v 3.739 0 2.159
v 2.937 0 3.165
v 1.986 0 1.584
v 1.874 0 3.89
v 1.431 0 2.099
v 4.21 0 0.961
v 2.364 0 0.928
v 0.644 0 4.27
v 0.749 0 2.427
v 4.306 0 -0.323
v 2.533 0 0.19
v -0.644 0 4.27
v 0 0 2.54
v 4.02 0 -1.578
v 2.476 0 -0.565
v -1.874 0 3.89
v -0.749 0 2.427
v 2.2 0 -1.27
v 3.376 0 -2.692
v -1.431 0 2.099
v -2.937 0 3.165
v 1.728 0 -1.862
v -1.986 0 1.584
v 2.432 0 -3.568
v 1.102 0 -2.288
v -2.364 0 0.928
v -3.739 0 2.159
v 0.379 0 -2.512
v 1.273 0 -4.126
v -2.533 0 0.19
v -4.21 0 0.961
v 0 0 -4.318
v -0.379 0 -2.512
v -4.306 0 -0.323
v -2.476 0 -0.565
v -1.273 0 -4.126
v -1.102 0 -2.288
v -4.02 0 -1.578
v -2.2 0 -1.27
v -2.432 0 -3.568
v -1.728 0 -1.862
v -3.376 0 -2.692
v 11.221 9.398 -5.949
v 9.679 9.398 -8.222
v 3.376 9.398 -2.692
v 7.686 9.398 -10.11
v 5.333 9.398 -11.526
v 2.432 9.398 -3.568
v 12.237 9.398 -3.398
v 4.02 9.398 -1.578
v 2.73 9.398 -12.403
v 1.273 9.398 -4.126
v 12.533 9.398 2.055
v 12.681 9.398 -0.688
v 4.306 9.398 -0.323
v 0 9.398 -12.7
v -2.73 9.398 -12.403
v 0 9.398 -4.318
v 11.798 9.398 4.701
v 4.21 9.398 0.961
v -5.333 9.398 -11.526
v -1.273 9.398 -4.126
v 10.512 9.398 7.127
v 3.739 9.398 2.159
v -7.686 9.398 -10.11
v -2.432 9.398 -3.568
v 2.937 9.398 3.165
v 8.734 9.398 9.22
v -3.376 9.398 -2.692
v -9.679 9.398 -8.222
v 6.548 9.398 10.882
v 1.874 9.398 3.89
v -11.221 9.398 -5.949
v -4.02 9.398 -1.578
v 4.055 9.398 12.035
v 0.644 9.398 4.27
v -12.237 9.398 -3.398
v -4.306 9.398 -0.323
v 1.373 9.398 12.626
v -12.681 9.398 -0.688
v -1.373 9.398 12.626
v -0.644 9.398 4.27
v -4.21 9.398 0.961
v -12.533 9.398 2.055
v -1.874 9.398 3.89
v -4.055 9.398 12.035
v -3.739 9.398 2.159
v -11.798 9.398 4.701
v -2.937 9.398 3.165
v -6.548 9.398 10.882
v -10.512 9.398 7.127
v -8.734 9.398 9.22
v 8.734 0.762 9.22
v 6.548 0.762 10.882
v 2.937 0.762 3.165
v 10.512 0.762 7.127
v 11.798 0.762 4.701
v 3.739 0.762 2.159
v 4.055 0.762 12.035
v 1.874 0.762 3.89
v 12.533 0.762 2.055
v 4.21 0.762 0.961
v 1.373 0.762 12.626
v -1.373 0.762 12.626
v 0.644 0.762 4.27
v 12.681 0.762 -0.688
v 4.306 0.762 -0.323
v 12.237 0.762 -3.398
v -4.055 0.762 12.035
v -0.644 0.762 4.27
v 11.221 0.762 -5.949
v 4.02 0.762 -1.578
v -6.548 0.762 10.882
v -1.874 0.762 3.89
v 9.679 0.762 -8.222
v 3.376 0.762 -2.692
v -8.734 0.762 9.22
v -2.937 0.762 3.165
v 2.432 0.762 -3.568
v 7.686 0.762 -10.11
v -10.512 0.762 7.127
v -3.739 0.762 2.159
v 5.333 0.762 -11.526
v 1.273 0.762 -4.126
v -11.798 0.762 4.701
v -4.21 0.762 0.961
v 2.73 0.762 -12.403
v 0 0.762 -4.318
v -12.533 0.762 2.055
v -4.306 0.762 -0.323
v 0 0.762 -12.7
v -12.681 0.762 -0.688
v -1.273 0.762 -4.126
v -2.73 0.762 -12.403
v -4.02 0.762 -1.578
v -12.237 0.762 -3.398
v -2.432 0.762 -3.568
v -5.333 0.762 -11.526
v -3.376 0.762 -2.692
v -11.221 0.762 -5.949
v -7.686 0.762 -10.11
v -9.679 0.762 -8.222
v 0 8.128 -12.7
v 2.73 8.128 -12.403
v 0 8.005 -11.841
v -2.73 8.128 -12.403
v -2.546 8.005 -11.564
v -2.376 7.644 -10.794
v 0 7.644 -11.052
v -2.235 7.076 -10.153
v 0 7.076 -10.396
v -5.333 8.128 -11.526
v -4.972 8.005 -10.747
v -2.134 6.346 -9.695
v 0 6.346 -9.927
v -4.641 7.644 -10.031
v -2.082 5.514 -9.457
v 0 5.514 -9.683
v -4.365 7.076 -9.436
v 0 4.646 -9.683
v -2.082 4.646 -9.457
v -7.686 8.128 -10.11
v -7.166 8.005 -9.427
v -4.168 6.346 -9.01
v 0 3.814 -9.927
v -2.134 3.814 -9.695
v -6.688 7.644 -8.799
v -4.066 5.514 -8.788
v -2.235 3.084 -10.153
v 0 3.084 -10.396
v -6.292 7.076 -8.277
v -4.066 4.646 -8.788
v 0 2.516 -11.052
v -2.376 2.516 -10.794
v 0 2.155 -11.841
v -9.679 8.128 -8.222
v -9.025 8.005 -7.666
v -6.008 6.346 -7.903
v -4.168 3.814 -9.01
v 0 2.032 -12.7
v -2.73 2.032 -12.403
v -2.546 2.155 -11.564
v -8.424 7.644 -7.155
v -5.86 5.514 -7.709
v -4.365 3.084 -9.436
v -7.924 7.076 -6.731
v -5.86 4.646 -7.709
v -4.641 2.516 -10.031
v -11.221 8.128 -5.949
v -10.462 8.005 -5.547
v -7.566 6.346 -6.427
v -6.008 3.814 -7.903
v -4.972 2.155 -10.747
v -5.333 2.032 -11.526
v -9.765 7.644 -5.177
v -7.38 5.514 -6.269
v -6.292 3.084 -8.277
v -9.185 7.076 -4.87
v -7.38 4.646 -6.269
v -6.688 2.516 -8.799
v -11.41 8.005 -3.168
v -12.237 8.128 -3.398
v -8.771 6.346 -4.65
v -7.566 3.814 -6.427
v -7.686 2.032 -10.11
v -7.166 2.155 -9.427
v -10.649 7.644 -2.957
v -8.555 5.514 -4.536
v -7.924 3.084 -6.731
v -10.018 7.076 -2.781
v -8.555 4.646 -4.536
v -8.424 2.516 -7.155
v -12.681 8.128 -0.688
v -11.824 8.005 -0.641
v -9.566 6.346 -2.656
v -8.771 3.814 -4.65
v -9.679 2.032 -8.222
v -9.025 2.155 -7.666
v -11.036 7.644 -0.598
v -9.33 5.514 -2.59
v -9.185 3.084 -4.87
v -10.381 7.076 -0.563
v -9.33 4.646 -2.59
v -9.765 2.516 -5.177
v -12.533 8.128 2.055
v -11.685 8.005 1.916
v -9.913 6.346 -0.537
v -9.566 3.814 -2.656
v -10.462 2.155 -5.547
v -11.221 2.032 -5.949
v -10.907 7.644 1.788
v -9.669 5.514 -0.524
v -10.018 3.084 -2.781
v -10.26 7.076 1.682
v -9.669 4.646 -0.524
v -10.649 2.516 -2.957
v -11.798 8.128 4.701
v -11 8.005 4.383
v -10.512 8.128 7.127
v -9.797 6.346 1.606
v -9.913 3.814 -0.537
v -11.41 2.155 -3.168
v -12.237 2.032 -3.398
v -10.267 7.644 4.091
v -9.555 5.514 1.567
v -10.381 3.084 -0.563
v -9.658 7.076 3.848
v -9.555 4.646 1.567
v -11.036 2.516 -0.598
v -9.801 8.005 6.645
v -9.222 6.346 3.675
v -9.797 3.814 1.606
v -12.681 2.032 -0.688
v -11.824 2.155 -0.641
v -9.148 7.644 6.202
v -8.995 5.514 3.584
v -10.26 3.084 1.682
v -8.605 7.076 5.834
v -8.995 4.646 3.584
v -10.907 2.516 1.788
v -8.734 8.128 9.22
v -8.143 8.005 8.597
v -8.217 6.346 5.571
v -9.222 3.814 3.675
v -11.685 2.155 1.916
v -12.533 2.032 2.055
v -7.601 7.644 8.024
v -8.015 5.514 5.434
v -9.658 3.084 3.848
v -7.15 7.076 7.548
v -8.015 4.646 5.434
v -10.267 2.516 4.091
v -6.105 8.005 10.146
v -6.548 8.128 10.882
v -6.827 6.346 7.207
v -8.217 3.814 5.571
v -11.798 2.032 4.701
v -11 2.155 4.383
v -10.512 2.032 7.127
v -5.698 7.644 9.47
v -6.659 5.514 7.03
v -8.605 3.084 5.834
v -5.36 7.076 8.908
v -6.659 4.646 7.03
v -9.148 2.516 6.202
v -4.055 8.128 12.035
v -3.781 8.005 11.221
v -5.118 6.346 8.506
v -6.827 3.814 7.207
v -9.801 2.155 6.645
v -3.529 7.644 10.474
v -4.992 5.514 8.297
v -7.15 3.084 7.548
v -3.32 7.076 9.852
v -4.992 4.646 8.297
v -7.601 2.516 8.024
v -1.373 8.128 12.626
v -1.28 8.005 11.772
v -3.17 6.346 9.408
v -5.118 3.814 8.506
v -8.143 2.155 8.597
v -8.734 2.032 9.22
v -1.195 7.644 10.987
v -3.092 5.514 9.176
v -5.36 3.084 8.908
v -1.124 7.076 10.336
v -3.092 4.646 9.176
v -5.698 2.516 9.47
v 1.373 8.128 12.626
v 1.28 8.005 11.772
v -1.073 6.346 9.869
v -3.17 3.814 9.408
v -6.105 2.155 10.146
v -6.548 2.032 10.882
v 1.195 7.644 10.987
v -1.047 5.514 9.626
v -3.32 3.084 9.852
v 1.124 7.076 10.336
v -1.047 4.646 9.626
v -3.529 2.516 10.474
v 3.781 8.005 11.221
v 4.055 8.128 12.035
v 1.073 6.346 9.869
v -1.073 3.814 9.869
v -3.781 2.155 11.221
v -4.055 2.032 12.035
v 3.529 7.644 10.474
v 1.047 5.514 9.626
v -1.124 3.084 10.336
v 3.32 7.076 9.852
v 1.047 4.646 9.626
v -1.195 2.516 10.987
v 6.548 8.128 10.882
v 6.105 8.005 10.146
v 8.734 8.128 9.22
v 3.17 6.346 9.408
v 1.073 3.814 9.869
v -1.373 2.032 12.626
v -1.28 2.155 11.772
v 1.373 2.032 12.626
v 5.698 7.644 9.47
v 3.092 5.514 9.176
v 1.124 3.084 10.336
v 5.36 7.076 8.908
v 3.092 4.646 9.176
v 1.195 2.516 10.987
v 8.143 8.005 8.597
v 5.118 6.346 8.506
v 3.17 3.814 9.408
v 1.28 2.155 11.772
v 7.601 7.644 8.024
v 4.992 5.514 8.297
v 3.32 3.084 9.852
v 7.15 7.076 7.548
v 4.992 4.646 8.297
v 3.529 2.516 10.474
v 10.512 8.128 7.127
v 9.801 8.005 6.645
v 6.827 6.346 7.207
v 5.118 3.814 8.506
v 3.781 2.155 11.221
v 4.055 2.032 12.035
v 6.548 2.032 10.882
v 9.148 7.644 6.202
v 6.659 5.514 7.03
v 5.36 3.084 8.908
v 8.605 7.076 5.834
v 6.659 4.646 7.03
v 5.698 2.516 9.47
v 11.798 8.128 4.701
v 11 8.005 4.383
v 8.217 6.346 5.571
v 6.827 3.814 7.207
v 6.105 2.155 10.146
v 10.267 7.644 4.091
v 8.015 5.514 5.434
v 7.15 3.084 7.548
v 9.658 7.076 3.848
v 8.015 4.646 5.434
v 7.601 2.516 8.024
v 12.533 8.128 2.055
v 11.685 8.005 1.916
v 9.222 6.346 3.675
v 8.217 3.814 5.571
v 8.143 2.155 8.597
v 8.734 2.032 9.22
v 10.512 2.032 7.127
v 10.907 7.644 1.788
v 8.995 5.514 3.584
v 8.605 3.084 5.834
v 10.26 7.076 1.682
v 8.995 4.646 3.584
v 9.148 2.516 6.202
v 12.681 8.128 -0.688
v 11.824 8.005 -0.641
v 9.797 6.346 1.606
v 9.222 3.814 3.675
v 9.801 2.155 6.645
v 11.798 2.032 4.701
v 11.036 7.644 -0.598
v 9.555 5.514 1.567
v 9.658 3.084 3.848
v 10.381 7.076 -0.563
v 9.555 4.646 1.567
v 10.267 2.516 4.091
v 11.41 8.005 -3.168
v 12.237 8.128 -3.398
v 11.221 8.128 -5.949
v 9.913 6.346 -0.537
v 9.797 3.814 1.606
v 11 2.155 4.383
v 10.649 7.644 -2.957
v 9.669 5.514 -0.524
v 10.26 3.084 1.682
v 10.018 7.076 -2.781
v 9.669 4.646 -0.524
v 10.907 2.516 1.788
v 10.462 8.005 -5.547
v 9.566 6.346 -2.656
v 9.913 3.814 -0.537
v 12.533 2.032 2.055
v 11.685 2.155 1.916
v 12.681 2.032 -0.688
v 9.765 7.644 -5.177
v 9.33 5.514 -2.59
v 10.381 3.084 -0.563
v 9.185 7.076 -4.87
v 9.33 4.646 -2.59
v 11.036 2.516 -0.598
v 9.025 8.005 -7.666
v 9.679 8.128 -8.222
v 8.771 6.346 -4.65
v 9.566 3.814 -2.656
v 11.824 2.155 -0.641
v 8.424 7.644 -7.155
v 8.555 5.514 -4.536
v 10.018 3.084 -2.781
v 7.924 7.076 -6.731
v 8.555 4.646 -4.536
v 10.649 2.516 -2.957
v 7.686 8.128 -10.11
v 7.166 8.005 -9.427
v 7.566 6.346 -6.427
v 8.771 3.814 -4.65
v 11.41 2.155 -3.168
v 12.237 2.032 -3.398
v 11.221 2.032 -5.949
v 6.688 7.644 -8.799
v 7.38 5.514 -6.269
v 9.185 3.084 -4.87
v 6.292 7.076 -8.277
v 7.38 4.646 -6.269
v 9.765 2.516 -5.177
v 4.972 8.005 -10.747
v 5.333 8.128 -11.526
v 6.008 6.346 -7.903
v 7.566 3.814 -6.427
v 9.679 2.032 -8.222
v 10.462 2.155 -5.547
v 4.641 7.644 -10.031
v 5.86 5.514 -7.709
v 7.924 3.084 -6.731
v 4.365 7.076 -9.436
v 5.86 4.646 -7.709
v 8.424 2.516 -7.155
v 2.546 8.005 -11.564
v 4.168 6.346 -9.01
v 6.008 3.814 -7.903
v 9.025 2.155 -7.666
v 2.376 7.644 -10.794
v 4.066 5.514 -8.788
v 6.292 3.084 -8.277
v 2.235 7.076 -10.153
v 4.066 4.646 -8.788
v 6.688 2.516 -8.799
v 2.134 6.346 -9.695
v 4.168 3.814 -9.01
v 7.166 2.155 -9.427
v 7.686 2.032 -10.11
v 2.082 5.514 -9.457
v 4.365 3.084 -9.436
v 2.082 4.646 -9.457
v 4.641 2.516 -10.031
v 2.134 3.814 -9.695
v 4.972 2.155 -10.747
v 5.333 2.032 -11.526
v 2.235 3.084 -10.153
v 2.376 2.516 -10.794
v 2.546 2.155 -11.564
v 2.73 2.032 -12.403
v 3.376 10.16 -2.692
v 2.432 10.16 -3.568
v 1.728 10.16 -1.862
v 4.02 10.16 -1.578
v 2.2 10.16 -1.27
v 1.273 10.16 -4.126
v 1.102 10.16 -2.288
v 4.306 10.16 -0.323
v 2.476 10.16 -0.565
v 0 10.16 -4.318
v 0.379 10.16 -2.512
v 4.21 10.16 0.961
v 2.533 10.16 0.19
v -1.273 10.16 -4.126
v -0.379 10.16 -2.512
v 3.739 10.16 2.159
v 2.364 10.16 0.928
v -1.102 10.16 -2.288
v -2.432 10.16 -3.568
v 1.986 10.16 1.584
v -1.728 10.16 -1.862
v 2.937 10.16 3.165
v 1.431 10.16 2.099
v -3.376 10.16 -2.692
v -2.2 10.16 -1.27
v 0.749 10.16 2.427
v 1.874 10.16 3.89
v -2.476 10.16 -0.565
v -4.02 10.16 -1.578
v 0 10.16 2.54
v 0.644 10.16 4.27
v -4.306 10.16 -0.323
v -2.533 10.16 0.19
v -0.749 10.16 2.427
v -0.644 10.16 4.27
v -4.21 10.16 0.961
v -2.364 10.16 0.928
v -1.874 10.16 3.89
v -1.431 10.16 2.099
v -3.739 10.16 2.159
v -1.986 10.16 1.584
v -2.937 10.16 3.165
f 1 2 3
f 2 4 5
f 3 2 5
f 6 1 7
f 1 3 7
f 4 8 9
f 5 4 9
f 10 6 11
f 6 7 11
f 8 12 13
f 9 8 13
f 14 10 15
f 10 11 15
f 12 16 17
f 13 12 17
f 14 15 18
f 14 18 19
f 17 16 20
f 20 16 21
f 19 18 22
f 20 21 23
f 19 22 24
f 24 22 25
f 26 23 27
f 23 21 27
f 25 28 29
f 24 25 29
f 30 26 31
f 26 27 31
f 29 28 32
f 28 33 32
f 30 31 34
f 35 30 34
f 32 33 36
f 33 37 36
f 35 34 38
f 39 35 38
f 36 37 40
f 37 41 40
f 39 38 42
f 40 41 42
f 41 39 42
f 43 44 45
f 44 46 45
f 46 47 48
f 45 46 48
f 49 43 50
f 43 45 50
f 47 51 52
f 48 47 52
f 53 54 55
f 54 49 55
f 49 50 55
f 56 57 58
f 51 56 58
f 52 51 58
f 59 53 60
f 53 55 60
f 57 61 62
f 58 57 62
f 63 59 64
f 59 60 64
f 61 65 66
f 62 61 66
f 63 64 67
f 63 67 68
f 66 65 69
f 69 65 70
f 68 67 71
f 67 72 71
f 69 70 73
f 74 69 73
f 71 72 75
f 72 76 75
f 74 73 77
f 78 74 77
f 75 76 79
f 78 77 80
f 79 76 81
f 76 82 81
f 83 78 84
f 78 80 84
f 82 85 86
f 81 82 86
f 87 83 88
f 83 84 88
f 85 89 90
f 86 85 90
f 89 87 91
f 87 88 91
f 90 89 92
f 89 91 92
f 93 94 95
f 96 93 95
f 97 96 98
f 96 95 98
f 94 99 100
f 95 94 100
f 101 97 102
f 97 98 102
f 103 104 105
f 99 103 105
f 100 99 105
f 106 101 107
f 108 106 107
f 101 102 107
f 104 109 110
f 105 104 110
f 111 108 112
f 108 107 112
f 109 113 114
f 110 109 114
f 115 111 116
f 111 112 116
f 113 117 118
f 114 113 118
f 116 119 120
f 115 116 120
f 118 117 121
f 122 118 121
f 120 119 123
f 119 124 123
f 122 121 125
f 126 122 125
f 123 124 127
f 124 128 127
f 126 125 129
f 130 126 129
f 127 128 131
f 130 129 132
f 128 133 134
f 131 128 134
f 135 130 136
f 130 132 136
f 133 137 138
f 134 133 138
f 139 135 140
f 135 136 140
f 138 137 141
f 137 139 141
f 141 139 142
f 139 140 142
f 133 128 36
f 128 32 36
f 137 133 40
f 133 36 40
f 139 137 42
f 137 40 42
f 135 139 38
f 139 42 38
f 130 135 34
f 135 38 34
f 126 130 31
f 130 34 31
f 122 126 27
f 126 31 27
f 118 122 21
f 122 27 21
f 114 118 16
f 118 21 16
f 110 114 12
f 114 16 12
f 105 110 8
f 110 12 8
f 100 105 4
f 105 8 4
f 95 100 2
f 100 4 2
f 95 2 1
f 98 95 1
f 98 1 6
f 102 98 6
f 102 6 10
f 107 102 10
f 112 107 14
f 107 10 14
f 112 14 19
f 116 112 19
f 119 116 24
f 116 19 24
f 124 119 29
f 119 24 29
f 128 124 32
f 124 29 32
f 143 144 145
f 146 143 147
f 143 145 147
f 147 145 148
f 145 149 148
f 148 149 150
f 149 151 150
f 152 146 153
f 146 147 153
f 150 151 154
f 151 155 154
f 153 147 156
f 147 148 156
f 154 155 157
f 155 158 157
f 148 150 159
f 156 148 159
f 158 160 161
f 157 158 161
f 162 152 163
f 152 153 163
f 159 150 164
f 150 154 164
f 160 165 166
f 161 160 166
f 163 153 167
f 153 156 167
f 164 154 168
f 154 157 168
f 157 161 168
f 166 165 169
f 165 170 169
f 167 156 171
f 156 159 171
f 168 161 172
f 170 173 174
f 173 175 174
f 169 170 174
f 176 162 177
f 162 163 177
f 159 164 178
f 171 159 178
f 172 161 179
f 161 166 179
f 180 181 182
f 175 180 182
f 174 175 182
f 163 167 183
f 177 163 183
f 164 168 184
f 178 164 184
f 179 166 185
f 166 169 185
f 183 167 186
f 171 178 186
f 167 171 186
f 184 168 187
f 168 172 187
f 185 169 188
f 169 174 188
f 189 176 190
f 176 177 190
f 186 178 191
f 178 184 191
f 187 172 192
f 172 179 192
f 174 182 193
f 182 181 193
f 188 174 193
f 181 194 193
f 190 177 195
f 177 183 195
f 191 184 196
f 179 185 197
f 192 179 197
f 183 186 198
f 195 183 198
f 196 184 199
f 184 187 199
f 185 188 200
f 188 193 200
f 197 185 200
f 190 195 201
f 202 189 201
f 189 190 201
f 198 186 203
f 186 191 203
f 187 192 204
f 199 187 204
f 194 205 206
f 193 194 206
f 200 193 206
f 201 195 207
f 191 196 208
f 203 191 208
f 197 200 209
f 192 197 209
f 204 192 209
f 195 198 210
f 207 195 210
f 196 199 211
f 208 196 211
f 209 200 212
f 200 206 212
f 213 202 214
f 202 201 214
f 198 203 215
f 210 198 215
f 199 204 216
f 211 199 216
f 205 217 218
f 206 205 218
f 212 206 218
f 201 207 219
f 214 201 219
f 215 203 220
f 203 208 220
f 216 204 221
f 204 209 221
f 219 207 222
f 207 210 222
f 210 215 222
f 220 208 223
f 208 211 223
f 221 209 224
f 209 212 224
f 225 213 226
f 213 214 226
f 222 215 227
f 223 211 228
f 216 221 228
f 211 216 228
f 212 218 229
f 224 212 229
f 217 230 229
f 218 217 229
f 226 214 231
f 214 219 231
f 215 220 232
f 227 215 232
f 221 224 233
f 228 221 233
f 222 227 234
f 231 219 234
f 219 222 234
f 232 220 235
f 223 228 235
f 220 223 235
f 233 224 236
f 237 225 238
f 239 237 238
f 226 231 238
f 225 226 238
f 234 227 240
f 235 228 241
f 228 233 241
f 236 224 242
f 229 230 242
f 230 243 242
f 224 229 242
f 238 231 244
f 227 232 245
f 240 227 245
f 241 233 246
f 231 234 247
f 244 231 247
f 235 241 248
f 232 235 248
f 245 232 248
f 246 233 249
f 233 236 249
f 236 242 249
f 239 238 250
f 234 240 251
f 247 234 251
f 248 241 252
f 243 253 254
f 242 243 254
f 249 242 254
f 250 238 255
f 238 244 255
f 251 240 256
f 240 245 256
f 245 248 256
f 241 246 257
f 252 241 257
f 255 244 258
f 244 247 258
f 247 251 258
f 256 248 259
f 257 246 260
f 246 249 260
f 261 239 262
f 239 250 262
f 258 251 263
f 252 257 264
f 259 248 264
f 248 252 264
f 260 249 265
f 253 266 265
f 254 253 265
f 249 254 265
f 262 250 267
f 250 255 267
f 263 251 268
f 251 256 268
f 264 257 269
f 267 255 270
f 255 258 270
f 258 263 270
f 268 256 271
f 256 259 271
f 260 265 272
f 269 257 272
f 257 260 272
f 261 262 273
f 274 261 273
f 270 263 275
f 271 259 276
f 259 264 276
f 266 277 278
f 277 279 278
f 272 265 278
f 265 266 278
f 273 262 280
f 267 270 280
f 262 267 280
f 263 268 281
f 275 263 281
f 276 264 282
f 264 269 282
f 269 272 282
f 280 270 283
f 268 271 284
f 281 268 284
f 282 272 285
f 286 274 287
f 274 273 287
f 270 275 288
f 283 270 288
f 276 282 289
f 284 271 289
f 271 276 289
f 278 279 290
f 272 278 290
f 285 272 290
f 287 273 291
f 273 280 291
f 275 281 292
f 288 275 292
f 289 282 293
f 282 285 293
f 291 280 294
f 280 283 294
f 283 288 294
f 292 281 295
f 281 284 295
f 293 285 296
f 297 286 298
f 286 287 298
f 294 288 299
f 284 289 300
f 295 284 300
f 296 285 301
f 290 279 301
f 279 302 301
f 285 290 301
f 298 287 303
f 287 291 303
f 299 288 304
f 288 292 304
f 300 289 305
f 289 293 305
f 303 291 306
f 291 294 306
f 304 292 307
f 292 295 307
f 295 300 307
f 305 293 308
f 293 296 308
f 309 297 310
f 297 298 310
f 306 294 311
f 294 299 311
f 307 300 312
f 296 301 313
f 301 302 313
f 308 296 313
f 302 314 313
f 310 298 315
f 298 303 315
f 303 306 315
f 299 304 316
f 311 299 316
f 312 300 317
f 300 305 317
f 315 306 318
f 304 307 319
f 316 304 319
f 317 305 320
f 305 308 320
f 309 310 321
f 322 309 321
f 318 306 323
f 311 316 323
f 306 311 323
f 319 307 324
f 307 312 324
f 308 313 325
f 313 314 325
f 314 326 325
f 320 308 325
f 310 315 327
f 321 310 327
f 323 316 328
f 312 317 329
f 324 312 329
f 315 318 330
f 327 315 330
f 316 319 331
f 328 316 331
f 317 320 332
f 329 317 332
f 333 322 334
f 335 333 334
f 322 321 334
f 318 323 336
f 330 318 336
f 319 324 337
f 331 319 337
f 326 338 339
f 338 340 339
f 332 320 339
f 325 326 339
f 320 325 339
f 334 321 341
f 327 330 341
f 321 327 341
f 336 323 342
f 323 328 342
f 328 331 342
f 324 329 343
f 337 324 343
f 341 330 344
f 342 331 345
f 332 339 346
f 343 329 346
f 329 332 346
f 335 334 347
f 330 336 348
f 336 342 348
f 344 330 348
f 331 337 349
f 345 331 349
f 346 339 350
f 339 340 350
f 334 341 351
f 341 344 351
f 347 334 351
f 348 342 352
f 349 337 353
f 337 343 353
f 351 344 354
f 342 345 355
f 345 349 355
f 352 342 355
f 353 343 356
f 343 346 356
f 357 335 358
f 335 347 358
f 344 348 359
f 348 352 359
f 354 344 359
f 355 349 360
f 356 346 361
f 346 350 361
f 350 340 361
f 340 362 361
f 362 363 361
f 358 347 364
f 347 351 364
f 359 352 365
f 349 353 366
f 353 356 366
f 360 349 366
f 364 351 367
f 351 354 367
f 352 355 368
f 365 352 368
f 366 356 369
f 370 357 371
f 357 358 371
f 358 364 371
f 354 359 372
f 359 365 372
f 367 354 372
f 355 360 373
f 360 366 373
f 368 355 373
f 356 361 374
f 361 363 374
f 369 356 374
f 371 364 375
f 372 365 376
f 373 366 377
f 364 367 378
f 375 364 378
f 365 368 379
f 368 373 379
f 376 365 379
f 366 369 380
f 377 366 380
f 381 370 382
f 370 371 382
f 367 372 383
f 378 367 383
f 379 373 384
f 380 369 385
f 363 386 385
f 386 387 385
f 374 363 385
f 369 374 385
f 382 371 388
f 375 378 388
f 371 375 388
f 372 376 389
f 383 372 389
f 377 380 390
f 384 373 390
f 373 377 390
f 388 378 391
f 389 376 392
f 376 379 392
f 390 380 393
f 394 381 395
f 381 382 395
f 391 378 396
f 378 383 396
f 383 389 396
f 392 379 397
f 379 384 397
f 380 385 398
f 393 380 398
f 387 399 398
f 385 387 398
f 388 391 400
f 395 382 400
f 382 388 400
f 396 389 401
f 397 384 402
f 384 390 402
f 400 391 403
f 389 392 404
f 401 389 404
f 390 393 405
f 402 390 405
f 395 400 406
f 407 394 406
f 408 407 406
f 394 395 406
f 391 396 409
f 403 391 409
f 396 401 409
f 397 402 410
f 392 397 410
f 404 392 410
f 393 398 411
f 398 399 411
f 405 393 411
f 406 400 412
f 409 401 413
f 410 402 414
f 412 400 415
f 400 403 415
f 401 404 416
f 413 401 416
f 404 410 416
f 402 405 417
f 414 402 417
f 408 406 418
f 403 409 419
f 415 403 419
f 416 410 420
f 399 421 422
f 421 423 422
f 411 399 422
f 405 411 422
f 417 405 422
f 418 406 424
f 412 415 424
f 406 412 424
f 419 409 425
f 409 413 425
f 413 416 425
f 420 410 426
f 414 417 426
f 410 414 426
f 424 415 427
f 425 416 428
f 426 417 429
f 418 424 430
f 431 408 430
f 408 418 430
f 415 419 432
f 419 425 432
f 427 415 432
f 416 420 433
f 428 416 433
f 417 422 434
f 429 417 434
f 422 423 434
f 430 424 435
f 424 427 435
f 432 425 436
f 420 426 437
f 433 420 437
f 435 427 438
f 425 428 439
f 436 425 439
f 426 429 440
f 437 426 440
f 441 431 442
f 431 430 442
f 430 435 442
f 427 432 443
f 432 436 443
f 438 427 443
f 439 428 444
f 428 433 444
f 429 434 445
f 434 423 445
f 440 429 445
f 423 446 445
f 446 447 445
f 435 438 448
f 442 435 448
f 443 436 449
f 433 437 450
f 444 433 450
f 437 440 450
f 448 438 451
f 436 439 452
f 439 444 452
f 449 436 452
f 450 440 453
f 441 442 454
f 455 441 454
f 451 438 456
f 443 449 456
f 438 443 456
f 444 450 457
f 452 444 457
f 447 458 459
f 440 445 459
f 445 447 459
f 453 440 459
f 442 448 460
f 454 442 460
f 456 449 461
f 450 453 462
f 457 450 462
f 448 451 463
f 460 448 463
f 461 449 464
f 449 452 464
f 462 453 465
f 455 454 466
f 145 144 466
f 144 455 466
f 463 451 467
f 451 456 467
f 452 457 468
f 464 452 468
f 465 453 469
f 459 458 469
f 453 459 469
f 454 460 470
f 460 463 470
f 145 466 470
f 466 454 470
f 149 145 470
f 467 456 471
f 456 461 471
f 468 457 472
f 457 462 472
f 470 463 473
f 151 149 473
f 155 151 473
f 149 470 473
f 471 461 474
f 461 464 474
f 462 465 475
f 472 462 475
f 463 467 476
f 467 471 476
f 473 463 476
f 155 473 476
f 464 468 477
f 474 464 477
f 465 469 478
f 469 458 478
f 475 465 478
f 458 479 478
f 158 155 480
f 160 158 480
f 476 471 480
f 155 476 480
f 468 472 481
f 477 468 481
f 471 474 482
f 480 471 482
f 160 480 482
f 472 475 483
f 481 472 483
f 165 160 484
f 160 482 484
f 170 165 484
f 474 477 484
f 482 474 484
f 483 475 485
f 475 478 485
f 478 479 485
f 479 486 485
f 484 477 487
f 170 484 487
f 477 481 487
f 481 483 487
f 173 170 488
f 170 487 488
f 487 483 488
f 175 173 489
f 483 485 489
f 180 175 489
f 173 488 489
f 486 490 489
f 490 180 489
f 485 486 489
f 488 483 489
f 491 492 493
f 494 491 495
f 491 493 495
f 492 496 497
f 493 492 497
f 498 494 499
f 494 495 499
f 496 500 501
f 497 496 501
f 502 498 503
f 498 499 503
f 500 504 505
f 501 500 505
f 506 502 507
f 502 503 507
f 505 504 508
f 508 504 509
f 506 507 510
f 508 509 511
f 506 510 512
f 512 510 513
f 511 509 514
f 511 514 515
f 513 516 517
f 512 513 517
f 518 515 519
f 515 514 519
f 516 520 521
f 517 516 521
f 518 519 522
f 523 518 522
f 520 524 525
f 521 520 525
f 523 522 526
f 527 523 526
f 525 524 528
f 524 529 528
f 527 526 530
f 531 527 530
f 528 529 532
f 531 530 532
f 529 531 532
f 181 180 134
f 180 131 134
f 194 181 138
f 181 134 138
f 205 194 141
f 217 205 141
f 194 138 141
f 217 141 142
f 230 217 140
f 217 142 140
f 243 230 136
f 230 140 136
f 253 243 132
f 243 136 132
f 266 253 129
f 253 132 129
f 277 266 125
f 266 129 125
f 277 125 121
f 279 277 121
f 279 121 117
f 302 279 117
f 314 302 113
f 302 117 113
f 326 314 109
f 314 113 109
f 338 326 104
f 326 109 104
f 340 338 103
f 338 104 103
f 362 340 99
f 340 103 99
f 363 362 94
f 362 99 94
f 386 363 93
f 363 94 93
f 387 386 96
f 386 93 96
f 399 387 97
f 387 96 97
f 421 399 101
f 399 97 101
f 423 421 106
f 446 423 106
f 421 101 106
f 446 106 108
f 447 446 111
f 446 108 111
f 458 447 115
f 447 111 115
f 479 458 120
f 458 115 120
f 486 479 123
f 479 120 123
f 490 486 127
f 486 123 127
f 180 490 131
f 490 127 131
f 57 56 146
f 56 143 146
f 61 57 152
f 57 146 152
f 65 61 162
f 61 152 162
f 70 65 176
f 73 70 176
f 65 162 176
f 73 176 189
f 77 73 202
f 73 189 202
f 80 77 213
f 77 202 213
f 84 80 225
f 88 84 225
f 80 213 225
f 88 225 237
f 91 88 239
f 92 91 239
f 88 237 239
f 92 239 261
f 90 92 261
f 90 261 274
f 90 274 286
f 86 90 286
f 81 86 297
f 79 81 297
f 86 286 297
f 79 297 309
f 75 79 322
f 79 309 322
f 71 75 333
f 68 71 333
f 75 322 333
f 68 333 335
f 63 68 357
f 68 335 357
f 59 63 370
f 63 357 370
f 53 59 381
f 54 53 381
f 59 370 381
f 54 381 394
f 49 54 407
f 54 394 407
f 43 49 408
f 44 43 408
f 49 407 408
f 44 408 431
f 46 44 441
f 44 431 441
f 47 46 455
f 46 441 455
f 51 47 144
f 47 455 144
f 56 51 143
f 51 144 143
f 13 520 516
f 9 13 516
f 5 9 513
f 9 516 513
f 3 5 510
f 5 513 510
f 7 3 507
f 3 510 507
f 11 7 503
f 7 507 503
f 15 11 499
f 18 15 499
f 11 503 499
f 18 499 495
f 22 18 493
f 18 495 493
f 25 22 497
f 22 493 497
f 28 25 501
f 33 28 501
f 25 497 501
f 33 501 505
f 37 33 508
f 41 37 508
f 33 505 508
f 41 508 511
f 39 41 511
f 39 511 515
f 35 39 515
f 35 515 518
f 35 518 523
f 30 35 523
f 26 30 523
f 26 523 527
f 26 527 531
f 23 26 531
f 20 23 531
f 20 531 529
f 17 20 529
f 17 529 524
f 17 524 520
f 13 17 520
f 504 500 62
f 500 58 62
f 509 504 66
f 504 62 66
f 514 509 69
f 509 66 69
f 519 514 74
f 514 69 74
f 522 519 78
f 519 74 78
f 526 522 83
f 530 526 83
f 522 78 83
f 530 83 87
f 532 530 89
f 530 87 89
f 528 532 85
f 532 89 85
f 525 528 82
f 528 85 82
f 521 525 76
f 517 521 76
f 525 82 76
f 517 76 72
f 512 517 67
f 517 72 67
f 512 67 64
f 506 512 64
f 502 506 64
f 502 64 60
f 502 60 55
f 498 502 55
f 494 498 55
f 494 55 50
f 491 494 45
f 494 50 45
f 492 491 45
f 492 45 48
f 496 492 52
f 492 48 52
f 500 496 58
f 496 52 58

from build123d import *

# Parameters (mm, degrees)
SKETCH2_R          = 2.54
CUT_EXTRUDE1_DEPTH = 21.635057548


with BuildPart() as part:
    # Sketch1 → Revolve1 (revolve)
    with BuildSketch(Plane.XY, mode=Mode.PRIVATE) as revolve1_sk:
        with BuildLine():
            Line((0, 0), (0, 10.16))
            Line((0, 10.16), (4.318, 10.16))
            Line((4.318, 10.16), (4.318, 9.398))
            Line((4.318, 9.398), (12.7, 9.398))
            Line((12.7, 9.398), (12.7, 8.128))
            ThreePointArc((12.7, 8.128), (9.652, 5.08), (12.7, 2.032))
            Line((12.7, 2.032), (12.7, 0.762))
            Line((12.7, 0.762), (4.318, 0.762))
            Line((4.318, 0.762), (4.318, 0))
            Line((4.318, 0), (0, 0))
        make_face()
    revolve(revolve1_sk.sketch.rotate(Axis((0, 0, 0), (0, 1, 0)), 90), axis=Axis((0, 0, 0), (0, 1, 0)))

    # Sketch2 → Cut-Extrude1 (cut, through all)
    with BuildSketch(Plane(origin=(0, 10.16, 0), x_dir=(1, 0, 0), z_dir=(0, 1, 0))):
        with Locations(Location((0, 0, 0), (0, 0, 270))):
            Circle(SKETCH2_R)
    extrude(amount=-CUT_EXTRUDE1_DEPTH, mode=Mode.SUBTRACT)


solid = part.part
